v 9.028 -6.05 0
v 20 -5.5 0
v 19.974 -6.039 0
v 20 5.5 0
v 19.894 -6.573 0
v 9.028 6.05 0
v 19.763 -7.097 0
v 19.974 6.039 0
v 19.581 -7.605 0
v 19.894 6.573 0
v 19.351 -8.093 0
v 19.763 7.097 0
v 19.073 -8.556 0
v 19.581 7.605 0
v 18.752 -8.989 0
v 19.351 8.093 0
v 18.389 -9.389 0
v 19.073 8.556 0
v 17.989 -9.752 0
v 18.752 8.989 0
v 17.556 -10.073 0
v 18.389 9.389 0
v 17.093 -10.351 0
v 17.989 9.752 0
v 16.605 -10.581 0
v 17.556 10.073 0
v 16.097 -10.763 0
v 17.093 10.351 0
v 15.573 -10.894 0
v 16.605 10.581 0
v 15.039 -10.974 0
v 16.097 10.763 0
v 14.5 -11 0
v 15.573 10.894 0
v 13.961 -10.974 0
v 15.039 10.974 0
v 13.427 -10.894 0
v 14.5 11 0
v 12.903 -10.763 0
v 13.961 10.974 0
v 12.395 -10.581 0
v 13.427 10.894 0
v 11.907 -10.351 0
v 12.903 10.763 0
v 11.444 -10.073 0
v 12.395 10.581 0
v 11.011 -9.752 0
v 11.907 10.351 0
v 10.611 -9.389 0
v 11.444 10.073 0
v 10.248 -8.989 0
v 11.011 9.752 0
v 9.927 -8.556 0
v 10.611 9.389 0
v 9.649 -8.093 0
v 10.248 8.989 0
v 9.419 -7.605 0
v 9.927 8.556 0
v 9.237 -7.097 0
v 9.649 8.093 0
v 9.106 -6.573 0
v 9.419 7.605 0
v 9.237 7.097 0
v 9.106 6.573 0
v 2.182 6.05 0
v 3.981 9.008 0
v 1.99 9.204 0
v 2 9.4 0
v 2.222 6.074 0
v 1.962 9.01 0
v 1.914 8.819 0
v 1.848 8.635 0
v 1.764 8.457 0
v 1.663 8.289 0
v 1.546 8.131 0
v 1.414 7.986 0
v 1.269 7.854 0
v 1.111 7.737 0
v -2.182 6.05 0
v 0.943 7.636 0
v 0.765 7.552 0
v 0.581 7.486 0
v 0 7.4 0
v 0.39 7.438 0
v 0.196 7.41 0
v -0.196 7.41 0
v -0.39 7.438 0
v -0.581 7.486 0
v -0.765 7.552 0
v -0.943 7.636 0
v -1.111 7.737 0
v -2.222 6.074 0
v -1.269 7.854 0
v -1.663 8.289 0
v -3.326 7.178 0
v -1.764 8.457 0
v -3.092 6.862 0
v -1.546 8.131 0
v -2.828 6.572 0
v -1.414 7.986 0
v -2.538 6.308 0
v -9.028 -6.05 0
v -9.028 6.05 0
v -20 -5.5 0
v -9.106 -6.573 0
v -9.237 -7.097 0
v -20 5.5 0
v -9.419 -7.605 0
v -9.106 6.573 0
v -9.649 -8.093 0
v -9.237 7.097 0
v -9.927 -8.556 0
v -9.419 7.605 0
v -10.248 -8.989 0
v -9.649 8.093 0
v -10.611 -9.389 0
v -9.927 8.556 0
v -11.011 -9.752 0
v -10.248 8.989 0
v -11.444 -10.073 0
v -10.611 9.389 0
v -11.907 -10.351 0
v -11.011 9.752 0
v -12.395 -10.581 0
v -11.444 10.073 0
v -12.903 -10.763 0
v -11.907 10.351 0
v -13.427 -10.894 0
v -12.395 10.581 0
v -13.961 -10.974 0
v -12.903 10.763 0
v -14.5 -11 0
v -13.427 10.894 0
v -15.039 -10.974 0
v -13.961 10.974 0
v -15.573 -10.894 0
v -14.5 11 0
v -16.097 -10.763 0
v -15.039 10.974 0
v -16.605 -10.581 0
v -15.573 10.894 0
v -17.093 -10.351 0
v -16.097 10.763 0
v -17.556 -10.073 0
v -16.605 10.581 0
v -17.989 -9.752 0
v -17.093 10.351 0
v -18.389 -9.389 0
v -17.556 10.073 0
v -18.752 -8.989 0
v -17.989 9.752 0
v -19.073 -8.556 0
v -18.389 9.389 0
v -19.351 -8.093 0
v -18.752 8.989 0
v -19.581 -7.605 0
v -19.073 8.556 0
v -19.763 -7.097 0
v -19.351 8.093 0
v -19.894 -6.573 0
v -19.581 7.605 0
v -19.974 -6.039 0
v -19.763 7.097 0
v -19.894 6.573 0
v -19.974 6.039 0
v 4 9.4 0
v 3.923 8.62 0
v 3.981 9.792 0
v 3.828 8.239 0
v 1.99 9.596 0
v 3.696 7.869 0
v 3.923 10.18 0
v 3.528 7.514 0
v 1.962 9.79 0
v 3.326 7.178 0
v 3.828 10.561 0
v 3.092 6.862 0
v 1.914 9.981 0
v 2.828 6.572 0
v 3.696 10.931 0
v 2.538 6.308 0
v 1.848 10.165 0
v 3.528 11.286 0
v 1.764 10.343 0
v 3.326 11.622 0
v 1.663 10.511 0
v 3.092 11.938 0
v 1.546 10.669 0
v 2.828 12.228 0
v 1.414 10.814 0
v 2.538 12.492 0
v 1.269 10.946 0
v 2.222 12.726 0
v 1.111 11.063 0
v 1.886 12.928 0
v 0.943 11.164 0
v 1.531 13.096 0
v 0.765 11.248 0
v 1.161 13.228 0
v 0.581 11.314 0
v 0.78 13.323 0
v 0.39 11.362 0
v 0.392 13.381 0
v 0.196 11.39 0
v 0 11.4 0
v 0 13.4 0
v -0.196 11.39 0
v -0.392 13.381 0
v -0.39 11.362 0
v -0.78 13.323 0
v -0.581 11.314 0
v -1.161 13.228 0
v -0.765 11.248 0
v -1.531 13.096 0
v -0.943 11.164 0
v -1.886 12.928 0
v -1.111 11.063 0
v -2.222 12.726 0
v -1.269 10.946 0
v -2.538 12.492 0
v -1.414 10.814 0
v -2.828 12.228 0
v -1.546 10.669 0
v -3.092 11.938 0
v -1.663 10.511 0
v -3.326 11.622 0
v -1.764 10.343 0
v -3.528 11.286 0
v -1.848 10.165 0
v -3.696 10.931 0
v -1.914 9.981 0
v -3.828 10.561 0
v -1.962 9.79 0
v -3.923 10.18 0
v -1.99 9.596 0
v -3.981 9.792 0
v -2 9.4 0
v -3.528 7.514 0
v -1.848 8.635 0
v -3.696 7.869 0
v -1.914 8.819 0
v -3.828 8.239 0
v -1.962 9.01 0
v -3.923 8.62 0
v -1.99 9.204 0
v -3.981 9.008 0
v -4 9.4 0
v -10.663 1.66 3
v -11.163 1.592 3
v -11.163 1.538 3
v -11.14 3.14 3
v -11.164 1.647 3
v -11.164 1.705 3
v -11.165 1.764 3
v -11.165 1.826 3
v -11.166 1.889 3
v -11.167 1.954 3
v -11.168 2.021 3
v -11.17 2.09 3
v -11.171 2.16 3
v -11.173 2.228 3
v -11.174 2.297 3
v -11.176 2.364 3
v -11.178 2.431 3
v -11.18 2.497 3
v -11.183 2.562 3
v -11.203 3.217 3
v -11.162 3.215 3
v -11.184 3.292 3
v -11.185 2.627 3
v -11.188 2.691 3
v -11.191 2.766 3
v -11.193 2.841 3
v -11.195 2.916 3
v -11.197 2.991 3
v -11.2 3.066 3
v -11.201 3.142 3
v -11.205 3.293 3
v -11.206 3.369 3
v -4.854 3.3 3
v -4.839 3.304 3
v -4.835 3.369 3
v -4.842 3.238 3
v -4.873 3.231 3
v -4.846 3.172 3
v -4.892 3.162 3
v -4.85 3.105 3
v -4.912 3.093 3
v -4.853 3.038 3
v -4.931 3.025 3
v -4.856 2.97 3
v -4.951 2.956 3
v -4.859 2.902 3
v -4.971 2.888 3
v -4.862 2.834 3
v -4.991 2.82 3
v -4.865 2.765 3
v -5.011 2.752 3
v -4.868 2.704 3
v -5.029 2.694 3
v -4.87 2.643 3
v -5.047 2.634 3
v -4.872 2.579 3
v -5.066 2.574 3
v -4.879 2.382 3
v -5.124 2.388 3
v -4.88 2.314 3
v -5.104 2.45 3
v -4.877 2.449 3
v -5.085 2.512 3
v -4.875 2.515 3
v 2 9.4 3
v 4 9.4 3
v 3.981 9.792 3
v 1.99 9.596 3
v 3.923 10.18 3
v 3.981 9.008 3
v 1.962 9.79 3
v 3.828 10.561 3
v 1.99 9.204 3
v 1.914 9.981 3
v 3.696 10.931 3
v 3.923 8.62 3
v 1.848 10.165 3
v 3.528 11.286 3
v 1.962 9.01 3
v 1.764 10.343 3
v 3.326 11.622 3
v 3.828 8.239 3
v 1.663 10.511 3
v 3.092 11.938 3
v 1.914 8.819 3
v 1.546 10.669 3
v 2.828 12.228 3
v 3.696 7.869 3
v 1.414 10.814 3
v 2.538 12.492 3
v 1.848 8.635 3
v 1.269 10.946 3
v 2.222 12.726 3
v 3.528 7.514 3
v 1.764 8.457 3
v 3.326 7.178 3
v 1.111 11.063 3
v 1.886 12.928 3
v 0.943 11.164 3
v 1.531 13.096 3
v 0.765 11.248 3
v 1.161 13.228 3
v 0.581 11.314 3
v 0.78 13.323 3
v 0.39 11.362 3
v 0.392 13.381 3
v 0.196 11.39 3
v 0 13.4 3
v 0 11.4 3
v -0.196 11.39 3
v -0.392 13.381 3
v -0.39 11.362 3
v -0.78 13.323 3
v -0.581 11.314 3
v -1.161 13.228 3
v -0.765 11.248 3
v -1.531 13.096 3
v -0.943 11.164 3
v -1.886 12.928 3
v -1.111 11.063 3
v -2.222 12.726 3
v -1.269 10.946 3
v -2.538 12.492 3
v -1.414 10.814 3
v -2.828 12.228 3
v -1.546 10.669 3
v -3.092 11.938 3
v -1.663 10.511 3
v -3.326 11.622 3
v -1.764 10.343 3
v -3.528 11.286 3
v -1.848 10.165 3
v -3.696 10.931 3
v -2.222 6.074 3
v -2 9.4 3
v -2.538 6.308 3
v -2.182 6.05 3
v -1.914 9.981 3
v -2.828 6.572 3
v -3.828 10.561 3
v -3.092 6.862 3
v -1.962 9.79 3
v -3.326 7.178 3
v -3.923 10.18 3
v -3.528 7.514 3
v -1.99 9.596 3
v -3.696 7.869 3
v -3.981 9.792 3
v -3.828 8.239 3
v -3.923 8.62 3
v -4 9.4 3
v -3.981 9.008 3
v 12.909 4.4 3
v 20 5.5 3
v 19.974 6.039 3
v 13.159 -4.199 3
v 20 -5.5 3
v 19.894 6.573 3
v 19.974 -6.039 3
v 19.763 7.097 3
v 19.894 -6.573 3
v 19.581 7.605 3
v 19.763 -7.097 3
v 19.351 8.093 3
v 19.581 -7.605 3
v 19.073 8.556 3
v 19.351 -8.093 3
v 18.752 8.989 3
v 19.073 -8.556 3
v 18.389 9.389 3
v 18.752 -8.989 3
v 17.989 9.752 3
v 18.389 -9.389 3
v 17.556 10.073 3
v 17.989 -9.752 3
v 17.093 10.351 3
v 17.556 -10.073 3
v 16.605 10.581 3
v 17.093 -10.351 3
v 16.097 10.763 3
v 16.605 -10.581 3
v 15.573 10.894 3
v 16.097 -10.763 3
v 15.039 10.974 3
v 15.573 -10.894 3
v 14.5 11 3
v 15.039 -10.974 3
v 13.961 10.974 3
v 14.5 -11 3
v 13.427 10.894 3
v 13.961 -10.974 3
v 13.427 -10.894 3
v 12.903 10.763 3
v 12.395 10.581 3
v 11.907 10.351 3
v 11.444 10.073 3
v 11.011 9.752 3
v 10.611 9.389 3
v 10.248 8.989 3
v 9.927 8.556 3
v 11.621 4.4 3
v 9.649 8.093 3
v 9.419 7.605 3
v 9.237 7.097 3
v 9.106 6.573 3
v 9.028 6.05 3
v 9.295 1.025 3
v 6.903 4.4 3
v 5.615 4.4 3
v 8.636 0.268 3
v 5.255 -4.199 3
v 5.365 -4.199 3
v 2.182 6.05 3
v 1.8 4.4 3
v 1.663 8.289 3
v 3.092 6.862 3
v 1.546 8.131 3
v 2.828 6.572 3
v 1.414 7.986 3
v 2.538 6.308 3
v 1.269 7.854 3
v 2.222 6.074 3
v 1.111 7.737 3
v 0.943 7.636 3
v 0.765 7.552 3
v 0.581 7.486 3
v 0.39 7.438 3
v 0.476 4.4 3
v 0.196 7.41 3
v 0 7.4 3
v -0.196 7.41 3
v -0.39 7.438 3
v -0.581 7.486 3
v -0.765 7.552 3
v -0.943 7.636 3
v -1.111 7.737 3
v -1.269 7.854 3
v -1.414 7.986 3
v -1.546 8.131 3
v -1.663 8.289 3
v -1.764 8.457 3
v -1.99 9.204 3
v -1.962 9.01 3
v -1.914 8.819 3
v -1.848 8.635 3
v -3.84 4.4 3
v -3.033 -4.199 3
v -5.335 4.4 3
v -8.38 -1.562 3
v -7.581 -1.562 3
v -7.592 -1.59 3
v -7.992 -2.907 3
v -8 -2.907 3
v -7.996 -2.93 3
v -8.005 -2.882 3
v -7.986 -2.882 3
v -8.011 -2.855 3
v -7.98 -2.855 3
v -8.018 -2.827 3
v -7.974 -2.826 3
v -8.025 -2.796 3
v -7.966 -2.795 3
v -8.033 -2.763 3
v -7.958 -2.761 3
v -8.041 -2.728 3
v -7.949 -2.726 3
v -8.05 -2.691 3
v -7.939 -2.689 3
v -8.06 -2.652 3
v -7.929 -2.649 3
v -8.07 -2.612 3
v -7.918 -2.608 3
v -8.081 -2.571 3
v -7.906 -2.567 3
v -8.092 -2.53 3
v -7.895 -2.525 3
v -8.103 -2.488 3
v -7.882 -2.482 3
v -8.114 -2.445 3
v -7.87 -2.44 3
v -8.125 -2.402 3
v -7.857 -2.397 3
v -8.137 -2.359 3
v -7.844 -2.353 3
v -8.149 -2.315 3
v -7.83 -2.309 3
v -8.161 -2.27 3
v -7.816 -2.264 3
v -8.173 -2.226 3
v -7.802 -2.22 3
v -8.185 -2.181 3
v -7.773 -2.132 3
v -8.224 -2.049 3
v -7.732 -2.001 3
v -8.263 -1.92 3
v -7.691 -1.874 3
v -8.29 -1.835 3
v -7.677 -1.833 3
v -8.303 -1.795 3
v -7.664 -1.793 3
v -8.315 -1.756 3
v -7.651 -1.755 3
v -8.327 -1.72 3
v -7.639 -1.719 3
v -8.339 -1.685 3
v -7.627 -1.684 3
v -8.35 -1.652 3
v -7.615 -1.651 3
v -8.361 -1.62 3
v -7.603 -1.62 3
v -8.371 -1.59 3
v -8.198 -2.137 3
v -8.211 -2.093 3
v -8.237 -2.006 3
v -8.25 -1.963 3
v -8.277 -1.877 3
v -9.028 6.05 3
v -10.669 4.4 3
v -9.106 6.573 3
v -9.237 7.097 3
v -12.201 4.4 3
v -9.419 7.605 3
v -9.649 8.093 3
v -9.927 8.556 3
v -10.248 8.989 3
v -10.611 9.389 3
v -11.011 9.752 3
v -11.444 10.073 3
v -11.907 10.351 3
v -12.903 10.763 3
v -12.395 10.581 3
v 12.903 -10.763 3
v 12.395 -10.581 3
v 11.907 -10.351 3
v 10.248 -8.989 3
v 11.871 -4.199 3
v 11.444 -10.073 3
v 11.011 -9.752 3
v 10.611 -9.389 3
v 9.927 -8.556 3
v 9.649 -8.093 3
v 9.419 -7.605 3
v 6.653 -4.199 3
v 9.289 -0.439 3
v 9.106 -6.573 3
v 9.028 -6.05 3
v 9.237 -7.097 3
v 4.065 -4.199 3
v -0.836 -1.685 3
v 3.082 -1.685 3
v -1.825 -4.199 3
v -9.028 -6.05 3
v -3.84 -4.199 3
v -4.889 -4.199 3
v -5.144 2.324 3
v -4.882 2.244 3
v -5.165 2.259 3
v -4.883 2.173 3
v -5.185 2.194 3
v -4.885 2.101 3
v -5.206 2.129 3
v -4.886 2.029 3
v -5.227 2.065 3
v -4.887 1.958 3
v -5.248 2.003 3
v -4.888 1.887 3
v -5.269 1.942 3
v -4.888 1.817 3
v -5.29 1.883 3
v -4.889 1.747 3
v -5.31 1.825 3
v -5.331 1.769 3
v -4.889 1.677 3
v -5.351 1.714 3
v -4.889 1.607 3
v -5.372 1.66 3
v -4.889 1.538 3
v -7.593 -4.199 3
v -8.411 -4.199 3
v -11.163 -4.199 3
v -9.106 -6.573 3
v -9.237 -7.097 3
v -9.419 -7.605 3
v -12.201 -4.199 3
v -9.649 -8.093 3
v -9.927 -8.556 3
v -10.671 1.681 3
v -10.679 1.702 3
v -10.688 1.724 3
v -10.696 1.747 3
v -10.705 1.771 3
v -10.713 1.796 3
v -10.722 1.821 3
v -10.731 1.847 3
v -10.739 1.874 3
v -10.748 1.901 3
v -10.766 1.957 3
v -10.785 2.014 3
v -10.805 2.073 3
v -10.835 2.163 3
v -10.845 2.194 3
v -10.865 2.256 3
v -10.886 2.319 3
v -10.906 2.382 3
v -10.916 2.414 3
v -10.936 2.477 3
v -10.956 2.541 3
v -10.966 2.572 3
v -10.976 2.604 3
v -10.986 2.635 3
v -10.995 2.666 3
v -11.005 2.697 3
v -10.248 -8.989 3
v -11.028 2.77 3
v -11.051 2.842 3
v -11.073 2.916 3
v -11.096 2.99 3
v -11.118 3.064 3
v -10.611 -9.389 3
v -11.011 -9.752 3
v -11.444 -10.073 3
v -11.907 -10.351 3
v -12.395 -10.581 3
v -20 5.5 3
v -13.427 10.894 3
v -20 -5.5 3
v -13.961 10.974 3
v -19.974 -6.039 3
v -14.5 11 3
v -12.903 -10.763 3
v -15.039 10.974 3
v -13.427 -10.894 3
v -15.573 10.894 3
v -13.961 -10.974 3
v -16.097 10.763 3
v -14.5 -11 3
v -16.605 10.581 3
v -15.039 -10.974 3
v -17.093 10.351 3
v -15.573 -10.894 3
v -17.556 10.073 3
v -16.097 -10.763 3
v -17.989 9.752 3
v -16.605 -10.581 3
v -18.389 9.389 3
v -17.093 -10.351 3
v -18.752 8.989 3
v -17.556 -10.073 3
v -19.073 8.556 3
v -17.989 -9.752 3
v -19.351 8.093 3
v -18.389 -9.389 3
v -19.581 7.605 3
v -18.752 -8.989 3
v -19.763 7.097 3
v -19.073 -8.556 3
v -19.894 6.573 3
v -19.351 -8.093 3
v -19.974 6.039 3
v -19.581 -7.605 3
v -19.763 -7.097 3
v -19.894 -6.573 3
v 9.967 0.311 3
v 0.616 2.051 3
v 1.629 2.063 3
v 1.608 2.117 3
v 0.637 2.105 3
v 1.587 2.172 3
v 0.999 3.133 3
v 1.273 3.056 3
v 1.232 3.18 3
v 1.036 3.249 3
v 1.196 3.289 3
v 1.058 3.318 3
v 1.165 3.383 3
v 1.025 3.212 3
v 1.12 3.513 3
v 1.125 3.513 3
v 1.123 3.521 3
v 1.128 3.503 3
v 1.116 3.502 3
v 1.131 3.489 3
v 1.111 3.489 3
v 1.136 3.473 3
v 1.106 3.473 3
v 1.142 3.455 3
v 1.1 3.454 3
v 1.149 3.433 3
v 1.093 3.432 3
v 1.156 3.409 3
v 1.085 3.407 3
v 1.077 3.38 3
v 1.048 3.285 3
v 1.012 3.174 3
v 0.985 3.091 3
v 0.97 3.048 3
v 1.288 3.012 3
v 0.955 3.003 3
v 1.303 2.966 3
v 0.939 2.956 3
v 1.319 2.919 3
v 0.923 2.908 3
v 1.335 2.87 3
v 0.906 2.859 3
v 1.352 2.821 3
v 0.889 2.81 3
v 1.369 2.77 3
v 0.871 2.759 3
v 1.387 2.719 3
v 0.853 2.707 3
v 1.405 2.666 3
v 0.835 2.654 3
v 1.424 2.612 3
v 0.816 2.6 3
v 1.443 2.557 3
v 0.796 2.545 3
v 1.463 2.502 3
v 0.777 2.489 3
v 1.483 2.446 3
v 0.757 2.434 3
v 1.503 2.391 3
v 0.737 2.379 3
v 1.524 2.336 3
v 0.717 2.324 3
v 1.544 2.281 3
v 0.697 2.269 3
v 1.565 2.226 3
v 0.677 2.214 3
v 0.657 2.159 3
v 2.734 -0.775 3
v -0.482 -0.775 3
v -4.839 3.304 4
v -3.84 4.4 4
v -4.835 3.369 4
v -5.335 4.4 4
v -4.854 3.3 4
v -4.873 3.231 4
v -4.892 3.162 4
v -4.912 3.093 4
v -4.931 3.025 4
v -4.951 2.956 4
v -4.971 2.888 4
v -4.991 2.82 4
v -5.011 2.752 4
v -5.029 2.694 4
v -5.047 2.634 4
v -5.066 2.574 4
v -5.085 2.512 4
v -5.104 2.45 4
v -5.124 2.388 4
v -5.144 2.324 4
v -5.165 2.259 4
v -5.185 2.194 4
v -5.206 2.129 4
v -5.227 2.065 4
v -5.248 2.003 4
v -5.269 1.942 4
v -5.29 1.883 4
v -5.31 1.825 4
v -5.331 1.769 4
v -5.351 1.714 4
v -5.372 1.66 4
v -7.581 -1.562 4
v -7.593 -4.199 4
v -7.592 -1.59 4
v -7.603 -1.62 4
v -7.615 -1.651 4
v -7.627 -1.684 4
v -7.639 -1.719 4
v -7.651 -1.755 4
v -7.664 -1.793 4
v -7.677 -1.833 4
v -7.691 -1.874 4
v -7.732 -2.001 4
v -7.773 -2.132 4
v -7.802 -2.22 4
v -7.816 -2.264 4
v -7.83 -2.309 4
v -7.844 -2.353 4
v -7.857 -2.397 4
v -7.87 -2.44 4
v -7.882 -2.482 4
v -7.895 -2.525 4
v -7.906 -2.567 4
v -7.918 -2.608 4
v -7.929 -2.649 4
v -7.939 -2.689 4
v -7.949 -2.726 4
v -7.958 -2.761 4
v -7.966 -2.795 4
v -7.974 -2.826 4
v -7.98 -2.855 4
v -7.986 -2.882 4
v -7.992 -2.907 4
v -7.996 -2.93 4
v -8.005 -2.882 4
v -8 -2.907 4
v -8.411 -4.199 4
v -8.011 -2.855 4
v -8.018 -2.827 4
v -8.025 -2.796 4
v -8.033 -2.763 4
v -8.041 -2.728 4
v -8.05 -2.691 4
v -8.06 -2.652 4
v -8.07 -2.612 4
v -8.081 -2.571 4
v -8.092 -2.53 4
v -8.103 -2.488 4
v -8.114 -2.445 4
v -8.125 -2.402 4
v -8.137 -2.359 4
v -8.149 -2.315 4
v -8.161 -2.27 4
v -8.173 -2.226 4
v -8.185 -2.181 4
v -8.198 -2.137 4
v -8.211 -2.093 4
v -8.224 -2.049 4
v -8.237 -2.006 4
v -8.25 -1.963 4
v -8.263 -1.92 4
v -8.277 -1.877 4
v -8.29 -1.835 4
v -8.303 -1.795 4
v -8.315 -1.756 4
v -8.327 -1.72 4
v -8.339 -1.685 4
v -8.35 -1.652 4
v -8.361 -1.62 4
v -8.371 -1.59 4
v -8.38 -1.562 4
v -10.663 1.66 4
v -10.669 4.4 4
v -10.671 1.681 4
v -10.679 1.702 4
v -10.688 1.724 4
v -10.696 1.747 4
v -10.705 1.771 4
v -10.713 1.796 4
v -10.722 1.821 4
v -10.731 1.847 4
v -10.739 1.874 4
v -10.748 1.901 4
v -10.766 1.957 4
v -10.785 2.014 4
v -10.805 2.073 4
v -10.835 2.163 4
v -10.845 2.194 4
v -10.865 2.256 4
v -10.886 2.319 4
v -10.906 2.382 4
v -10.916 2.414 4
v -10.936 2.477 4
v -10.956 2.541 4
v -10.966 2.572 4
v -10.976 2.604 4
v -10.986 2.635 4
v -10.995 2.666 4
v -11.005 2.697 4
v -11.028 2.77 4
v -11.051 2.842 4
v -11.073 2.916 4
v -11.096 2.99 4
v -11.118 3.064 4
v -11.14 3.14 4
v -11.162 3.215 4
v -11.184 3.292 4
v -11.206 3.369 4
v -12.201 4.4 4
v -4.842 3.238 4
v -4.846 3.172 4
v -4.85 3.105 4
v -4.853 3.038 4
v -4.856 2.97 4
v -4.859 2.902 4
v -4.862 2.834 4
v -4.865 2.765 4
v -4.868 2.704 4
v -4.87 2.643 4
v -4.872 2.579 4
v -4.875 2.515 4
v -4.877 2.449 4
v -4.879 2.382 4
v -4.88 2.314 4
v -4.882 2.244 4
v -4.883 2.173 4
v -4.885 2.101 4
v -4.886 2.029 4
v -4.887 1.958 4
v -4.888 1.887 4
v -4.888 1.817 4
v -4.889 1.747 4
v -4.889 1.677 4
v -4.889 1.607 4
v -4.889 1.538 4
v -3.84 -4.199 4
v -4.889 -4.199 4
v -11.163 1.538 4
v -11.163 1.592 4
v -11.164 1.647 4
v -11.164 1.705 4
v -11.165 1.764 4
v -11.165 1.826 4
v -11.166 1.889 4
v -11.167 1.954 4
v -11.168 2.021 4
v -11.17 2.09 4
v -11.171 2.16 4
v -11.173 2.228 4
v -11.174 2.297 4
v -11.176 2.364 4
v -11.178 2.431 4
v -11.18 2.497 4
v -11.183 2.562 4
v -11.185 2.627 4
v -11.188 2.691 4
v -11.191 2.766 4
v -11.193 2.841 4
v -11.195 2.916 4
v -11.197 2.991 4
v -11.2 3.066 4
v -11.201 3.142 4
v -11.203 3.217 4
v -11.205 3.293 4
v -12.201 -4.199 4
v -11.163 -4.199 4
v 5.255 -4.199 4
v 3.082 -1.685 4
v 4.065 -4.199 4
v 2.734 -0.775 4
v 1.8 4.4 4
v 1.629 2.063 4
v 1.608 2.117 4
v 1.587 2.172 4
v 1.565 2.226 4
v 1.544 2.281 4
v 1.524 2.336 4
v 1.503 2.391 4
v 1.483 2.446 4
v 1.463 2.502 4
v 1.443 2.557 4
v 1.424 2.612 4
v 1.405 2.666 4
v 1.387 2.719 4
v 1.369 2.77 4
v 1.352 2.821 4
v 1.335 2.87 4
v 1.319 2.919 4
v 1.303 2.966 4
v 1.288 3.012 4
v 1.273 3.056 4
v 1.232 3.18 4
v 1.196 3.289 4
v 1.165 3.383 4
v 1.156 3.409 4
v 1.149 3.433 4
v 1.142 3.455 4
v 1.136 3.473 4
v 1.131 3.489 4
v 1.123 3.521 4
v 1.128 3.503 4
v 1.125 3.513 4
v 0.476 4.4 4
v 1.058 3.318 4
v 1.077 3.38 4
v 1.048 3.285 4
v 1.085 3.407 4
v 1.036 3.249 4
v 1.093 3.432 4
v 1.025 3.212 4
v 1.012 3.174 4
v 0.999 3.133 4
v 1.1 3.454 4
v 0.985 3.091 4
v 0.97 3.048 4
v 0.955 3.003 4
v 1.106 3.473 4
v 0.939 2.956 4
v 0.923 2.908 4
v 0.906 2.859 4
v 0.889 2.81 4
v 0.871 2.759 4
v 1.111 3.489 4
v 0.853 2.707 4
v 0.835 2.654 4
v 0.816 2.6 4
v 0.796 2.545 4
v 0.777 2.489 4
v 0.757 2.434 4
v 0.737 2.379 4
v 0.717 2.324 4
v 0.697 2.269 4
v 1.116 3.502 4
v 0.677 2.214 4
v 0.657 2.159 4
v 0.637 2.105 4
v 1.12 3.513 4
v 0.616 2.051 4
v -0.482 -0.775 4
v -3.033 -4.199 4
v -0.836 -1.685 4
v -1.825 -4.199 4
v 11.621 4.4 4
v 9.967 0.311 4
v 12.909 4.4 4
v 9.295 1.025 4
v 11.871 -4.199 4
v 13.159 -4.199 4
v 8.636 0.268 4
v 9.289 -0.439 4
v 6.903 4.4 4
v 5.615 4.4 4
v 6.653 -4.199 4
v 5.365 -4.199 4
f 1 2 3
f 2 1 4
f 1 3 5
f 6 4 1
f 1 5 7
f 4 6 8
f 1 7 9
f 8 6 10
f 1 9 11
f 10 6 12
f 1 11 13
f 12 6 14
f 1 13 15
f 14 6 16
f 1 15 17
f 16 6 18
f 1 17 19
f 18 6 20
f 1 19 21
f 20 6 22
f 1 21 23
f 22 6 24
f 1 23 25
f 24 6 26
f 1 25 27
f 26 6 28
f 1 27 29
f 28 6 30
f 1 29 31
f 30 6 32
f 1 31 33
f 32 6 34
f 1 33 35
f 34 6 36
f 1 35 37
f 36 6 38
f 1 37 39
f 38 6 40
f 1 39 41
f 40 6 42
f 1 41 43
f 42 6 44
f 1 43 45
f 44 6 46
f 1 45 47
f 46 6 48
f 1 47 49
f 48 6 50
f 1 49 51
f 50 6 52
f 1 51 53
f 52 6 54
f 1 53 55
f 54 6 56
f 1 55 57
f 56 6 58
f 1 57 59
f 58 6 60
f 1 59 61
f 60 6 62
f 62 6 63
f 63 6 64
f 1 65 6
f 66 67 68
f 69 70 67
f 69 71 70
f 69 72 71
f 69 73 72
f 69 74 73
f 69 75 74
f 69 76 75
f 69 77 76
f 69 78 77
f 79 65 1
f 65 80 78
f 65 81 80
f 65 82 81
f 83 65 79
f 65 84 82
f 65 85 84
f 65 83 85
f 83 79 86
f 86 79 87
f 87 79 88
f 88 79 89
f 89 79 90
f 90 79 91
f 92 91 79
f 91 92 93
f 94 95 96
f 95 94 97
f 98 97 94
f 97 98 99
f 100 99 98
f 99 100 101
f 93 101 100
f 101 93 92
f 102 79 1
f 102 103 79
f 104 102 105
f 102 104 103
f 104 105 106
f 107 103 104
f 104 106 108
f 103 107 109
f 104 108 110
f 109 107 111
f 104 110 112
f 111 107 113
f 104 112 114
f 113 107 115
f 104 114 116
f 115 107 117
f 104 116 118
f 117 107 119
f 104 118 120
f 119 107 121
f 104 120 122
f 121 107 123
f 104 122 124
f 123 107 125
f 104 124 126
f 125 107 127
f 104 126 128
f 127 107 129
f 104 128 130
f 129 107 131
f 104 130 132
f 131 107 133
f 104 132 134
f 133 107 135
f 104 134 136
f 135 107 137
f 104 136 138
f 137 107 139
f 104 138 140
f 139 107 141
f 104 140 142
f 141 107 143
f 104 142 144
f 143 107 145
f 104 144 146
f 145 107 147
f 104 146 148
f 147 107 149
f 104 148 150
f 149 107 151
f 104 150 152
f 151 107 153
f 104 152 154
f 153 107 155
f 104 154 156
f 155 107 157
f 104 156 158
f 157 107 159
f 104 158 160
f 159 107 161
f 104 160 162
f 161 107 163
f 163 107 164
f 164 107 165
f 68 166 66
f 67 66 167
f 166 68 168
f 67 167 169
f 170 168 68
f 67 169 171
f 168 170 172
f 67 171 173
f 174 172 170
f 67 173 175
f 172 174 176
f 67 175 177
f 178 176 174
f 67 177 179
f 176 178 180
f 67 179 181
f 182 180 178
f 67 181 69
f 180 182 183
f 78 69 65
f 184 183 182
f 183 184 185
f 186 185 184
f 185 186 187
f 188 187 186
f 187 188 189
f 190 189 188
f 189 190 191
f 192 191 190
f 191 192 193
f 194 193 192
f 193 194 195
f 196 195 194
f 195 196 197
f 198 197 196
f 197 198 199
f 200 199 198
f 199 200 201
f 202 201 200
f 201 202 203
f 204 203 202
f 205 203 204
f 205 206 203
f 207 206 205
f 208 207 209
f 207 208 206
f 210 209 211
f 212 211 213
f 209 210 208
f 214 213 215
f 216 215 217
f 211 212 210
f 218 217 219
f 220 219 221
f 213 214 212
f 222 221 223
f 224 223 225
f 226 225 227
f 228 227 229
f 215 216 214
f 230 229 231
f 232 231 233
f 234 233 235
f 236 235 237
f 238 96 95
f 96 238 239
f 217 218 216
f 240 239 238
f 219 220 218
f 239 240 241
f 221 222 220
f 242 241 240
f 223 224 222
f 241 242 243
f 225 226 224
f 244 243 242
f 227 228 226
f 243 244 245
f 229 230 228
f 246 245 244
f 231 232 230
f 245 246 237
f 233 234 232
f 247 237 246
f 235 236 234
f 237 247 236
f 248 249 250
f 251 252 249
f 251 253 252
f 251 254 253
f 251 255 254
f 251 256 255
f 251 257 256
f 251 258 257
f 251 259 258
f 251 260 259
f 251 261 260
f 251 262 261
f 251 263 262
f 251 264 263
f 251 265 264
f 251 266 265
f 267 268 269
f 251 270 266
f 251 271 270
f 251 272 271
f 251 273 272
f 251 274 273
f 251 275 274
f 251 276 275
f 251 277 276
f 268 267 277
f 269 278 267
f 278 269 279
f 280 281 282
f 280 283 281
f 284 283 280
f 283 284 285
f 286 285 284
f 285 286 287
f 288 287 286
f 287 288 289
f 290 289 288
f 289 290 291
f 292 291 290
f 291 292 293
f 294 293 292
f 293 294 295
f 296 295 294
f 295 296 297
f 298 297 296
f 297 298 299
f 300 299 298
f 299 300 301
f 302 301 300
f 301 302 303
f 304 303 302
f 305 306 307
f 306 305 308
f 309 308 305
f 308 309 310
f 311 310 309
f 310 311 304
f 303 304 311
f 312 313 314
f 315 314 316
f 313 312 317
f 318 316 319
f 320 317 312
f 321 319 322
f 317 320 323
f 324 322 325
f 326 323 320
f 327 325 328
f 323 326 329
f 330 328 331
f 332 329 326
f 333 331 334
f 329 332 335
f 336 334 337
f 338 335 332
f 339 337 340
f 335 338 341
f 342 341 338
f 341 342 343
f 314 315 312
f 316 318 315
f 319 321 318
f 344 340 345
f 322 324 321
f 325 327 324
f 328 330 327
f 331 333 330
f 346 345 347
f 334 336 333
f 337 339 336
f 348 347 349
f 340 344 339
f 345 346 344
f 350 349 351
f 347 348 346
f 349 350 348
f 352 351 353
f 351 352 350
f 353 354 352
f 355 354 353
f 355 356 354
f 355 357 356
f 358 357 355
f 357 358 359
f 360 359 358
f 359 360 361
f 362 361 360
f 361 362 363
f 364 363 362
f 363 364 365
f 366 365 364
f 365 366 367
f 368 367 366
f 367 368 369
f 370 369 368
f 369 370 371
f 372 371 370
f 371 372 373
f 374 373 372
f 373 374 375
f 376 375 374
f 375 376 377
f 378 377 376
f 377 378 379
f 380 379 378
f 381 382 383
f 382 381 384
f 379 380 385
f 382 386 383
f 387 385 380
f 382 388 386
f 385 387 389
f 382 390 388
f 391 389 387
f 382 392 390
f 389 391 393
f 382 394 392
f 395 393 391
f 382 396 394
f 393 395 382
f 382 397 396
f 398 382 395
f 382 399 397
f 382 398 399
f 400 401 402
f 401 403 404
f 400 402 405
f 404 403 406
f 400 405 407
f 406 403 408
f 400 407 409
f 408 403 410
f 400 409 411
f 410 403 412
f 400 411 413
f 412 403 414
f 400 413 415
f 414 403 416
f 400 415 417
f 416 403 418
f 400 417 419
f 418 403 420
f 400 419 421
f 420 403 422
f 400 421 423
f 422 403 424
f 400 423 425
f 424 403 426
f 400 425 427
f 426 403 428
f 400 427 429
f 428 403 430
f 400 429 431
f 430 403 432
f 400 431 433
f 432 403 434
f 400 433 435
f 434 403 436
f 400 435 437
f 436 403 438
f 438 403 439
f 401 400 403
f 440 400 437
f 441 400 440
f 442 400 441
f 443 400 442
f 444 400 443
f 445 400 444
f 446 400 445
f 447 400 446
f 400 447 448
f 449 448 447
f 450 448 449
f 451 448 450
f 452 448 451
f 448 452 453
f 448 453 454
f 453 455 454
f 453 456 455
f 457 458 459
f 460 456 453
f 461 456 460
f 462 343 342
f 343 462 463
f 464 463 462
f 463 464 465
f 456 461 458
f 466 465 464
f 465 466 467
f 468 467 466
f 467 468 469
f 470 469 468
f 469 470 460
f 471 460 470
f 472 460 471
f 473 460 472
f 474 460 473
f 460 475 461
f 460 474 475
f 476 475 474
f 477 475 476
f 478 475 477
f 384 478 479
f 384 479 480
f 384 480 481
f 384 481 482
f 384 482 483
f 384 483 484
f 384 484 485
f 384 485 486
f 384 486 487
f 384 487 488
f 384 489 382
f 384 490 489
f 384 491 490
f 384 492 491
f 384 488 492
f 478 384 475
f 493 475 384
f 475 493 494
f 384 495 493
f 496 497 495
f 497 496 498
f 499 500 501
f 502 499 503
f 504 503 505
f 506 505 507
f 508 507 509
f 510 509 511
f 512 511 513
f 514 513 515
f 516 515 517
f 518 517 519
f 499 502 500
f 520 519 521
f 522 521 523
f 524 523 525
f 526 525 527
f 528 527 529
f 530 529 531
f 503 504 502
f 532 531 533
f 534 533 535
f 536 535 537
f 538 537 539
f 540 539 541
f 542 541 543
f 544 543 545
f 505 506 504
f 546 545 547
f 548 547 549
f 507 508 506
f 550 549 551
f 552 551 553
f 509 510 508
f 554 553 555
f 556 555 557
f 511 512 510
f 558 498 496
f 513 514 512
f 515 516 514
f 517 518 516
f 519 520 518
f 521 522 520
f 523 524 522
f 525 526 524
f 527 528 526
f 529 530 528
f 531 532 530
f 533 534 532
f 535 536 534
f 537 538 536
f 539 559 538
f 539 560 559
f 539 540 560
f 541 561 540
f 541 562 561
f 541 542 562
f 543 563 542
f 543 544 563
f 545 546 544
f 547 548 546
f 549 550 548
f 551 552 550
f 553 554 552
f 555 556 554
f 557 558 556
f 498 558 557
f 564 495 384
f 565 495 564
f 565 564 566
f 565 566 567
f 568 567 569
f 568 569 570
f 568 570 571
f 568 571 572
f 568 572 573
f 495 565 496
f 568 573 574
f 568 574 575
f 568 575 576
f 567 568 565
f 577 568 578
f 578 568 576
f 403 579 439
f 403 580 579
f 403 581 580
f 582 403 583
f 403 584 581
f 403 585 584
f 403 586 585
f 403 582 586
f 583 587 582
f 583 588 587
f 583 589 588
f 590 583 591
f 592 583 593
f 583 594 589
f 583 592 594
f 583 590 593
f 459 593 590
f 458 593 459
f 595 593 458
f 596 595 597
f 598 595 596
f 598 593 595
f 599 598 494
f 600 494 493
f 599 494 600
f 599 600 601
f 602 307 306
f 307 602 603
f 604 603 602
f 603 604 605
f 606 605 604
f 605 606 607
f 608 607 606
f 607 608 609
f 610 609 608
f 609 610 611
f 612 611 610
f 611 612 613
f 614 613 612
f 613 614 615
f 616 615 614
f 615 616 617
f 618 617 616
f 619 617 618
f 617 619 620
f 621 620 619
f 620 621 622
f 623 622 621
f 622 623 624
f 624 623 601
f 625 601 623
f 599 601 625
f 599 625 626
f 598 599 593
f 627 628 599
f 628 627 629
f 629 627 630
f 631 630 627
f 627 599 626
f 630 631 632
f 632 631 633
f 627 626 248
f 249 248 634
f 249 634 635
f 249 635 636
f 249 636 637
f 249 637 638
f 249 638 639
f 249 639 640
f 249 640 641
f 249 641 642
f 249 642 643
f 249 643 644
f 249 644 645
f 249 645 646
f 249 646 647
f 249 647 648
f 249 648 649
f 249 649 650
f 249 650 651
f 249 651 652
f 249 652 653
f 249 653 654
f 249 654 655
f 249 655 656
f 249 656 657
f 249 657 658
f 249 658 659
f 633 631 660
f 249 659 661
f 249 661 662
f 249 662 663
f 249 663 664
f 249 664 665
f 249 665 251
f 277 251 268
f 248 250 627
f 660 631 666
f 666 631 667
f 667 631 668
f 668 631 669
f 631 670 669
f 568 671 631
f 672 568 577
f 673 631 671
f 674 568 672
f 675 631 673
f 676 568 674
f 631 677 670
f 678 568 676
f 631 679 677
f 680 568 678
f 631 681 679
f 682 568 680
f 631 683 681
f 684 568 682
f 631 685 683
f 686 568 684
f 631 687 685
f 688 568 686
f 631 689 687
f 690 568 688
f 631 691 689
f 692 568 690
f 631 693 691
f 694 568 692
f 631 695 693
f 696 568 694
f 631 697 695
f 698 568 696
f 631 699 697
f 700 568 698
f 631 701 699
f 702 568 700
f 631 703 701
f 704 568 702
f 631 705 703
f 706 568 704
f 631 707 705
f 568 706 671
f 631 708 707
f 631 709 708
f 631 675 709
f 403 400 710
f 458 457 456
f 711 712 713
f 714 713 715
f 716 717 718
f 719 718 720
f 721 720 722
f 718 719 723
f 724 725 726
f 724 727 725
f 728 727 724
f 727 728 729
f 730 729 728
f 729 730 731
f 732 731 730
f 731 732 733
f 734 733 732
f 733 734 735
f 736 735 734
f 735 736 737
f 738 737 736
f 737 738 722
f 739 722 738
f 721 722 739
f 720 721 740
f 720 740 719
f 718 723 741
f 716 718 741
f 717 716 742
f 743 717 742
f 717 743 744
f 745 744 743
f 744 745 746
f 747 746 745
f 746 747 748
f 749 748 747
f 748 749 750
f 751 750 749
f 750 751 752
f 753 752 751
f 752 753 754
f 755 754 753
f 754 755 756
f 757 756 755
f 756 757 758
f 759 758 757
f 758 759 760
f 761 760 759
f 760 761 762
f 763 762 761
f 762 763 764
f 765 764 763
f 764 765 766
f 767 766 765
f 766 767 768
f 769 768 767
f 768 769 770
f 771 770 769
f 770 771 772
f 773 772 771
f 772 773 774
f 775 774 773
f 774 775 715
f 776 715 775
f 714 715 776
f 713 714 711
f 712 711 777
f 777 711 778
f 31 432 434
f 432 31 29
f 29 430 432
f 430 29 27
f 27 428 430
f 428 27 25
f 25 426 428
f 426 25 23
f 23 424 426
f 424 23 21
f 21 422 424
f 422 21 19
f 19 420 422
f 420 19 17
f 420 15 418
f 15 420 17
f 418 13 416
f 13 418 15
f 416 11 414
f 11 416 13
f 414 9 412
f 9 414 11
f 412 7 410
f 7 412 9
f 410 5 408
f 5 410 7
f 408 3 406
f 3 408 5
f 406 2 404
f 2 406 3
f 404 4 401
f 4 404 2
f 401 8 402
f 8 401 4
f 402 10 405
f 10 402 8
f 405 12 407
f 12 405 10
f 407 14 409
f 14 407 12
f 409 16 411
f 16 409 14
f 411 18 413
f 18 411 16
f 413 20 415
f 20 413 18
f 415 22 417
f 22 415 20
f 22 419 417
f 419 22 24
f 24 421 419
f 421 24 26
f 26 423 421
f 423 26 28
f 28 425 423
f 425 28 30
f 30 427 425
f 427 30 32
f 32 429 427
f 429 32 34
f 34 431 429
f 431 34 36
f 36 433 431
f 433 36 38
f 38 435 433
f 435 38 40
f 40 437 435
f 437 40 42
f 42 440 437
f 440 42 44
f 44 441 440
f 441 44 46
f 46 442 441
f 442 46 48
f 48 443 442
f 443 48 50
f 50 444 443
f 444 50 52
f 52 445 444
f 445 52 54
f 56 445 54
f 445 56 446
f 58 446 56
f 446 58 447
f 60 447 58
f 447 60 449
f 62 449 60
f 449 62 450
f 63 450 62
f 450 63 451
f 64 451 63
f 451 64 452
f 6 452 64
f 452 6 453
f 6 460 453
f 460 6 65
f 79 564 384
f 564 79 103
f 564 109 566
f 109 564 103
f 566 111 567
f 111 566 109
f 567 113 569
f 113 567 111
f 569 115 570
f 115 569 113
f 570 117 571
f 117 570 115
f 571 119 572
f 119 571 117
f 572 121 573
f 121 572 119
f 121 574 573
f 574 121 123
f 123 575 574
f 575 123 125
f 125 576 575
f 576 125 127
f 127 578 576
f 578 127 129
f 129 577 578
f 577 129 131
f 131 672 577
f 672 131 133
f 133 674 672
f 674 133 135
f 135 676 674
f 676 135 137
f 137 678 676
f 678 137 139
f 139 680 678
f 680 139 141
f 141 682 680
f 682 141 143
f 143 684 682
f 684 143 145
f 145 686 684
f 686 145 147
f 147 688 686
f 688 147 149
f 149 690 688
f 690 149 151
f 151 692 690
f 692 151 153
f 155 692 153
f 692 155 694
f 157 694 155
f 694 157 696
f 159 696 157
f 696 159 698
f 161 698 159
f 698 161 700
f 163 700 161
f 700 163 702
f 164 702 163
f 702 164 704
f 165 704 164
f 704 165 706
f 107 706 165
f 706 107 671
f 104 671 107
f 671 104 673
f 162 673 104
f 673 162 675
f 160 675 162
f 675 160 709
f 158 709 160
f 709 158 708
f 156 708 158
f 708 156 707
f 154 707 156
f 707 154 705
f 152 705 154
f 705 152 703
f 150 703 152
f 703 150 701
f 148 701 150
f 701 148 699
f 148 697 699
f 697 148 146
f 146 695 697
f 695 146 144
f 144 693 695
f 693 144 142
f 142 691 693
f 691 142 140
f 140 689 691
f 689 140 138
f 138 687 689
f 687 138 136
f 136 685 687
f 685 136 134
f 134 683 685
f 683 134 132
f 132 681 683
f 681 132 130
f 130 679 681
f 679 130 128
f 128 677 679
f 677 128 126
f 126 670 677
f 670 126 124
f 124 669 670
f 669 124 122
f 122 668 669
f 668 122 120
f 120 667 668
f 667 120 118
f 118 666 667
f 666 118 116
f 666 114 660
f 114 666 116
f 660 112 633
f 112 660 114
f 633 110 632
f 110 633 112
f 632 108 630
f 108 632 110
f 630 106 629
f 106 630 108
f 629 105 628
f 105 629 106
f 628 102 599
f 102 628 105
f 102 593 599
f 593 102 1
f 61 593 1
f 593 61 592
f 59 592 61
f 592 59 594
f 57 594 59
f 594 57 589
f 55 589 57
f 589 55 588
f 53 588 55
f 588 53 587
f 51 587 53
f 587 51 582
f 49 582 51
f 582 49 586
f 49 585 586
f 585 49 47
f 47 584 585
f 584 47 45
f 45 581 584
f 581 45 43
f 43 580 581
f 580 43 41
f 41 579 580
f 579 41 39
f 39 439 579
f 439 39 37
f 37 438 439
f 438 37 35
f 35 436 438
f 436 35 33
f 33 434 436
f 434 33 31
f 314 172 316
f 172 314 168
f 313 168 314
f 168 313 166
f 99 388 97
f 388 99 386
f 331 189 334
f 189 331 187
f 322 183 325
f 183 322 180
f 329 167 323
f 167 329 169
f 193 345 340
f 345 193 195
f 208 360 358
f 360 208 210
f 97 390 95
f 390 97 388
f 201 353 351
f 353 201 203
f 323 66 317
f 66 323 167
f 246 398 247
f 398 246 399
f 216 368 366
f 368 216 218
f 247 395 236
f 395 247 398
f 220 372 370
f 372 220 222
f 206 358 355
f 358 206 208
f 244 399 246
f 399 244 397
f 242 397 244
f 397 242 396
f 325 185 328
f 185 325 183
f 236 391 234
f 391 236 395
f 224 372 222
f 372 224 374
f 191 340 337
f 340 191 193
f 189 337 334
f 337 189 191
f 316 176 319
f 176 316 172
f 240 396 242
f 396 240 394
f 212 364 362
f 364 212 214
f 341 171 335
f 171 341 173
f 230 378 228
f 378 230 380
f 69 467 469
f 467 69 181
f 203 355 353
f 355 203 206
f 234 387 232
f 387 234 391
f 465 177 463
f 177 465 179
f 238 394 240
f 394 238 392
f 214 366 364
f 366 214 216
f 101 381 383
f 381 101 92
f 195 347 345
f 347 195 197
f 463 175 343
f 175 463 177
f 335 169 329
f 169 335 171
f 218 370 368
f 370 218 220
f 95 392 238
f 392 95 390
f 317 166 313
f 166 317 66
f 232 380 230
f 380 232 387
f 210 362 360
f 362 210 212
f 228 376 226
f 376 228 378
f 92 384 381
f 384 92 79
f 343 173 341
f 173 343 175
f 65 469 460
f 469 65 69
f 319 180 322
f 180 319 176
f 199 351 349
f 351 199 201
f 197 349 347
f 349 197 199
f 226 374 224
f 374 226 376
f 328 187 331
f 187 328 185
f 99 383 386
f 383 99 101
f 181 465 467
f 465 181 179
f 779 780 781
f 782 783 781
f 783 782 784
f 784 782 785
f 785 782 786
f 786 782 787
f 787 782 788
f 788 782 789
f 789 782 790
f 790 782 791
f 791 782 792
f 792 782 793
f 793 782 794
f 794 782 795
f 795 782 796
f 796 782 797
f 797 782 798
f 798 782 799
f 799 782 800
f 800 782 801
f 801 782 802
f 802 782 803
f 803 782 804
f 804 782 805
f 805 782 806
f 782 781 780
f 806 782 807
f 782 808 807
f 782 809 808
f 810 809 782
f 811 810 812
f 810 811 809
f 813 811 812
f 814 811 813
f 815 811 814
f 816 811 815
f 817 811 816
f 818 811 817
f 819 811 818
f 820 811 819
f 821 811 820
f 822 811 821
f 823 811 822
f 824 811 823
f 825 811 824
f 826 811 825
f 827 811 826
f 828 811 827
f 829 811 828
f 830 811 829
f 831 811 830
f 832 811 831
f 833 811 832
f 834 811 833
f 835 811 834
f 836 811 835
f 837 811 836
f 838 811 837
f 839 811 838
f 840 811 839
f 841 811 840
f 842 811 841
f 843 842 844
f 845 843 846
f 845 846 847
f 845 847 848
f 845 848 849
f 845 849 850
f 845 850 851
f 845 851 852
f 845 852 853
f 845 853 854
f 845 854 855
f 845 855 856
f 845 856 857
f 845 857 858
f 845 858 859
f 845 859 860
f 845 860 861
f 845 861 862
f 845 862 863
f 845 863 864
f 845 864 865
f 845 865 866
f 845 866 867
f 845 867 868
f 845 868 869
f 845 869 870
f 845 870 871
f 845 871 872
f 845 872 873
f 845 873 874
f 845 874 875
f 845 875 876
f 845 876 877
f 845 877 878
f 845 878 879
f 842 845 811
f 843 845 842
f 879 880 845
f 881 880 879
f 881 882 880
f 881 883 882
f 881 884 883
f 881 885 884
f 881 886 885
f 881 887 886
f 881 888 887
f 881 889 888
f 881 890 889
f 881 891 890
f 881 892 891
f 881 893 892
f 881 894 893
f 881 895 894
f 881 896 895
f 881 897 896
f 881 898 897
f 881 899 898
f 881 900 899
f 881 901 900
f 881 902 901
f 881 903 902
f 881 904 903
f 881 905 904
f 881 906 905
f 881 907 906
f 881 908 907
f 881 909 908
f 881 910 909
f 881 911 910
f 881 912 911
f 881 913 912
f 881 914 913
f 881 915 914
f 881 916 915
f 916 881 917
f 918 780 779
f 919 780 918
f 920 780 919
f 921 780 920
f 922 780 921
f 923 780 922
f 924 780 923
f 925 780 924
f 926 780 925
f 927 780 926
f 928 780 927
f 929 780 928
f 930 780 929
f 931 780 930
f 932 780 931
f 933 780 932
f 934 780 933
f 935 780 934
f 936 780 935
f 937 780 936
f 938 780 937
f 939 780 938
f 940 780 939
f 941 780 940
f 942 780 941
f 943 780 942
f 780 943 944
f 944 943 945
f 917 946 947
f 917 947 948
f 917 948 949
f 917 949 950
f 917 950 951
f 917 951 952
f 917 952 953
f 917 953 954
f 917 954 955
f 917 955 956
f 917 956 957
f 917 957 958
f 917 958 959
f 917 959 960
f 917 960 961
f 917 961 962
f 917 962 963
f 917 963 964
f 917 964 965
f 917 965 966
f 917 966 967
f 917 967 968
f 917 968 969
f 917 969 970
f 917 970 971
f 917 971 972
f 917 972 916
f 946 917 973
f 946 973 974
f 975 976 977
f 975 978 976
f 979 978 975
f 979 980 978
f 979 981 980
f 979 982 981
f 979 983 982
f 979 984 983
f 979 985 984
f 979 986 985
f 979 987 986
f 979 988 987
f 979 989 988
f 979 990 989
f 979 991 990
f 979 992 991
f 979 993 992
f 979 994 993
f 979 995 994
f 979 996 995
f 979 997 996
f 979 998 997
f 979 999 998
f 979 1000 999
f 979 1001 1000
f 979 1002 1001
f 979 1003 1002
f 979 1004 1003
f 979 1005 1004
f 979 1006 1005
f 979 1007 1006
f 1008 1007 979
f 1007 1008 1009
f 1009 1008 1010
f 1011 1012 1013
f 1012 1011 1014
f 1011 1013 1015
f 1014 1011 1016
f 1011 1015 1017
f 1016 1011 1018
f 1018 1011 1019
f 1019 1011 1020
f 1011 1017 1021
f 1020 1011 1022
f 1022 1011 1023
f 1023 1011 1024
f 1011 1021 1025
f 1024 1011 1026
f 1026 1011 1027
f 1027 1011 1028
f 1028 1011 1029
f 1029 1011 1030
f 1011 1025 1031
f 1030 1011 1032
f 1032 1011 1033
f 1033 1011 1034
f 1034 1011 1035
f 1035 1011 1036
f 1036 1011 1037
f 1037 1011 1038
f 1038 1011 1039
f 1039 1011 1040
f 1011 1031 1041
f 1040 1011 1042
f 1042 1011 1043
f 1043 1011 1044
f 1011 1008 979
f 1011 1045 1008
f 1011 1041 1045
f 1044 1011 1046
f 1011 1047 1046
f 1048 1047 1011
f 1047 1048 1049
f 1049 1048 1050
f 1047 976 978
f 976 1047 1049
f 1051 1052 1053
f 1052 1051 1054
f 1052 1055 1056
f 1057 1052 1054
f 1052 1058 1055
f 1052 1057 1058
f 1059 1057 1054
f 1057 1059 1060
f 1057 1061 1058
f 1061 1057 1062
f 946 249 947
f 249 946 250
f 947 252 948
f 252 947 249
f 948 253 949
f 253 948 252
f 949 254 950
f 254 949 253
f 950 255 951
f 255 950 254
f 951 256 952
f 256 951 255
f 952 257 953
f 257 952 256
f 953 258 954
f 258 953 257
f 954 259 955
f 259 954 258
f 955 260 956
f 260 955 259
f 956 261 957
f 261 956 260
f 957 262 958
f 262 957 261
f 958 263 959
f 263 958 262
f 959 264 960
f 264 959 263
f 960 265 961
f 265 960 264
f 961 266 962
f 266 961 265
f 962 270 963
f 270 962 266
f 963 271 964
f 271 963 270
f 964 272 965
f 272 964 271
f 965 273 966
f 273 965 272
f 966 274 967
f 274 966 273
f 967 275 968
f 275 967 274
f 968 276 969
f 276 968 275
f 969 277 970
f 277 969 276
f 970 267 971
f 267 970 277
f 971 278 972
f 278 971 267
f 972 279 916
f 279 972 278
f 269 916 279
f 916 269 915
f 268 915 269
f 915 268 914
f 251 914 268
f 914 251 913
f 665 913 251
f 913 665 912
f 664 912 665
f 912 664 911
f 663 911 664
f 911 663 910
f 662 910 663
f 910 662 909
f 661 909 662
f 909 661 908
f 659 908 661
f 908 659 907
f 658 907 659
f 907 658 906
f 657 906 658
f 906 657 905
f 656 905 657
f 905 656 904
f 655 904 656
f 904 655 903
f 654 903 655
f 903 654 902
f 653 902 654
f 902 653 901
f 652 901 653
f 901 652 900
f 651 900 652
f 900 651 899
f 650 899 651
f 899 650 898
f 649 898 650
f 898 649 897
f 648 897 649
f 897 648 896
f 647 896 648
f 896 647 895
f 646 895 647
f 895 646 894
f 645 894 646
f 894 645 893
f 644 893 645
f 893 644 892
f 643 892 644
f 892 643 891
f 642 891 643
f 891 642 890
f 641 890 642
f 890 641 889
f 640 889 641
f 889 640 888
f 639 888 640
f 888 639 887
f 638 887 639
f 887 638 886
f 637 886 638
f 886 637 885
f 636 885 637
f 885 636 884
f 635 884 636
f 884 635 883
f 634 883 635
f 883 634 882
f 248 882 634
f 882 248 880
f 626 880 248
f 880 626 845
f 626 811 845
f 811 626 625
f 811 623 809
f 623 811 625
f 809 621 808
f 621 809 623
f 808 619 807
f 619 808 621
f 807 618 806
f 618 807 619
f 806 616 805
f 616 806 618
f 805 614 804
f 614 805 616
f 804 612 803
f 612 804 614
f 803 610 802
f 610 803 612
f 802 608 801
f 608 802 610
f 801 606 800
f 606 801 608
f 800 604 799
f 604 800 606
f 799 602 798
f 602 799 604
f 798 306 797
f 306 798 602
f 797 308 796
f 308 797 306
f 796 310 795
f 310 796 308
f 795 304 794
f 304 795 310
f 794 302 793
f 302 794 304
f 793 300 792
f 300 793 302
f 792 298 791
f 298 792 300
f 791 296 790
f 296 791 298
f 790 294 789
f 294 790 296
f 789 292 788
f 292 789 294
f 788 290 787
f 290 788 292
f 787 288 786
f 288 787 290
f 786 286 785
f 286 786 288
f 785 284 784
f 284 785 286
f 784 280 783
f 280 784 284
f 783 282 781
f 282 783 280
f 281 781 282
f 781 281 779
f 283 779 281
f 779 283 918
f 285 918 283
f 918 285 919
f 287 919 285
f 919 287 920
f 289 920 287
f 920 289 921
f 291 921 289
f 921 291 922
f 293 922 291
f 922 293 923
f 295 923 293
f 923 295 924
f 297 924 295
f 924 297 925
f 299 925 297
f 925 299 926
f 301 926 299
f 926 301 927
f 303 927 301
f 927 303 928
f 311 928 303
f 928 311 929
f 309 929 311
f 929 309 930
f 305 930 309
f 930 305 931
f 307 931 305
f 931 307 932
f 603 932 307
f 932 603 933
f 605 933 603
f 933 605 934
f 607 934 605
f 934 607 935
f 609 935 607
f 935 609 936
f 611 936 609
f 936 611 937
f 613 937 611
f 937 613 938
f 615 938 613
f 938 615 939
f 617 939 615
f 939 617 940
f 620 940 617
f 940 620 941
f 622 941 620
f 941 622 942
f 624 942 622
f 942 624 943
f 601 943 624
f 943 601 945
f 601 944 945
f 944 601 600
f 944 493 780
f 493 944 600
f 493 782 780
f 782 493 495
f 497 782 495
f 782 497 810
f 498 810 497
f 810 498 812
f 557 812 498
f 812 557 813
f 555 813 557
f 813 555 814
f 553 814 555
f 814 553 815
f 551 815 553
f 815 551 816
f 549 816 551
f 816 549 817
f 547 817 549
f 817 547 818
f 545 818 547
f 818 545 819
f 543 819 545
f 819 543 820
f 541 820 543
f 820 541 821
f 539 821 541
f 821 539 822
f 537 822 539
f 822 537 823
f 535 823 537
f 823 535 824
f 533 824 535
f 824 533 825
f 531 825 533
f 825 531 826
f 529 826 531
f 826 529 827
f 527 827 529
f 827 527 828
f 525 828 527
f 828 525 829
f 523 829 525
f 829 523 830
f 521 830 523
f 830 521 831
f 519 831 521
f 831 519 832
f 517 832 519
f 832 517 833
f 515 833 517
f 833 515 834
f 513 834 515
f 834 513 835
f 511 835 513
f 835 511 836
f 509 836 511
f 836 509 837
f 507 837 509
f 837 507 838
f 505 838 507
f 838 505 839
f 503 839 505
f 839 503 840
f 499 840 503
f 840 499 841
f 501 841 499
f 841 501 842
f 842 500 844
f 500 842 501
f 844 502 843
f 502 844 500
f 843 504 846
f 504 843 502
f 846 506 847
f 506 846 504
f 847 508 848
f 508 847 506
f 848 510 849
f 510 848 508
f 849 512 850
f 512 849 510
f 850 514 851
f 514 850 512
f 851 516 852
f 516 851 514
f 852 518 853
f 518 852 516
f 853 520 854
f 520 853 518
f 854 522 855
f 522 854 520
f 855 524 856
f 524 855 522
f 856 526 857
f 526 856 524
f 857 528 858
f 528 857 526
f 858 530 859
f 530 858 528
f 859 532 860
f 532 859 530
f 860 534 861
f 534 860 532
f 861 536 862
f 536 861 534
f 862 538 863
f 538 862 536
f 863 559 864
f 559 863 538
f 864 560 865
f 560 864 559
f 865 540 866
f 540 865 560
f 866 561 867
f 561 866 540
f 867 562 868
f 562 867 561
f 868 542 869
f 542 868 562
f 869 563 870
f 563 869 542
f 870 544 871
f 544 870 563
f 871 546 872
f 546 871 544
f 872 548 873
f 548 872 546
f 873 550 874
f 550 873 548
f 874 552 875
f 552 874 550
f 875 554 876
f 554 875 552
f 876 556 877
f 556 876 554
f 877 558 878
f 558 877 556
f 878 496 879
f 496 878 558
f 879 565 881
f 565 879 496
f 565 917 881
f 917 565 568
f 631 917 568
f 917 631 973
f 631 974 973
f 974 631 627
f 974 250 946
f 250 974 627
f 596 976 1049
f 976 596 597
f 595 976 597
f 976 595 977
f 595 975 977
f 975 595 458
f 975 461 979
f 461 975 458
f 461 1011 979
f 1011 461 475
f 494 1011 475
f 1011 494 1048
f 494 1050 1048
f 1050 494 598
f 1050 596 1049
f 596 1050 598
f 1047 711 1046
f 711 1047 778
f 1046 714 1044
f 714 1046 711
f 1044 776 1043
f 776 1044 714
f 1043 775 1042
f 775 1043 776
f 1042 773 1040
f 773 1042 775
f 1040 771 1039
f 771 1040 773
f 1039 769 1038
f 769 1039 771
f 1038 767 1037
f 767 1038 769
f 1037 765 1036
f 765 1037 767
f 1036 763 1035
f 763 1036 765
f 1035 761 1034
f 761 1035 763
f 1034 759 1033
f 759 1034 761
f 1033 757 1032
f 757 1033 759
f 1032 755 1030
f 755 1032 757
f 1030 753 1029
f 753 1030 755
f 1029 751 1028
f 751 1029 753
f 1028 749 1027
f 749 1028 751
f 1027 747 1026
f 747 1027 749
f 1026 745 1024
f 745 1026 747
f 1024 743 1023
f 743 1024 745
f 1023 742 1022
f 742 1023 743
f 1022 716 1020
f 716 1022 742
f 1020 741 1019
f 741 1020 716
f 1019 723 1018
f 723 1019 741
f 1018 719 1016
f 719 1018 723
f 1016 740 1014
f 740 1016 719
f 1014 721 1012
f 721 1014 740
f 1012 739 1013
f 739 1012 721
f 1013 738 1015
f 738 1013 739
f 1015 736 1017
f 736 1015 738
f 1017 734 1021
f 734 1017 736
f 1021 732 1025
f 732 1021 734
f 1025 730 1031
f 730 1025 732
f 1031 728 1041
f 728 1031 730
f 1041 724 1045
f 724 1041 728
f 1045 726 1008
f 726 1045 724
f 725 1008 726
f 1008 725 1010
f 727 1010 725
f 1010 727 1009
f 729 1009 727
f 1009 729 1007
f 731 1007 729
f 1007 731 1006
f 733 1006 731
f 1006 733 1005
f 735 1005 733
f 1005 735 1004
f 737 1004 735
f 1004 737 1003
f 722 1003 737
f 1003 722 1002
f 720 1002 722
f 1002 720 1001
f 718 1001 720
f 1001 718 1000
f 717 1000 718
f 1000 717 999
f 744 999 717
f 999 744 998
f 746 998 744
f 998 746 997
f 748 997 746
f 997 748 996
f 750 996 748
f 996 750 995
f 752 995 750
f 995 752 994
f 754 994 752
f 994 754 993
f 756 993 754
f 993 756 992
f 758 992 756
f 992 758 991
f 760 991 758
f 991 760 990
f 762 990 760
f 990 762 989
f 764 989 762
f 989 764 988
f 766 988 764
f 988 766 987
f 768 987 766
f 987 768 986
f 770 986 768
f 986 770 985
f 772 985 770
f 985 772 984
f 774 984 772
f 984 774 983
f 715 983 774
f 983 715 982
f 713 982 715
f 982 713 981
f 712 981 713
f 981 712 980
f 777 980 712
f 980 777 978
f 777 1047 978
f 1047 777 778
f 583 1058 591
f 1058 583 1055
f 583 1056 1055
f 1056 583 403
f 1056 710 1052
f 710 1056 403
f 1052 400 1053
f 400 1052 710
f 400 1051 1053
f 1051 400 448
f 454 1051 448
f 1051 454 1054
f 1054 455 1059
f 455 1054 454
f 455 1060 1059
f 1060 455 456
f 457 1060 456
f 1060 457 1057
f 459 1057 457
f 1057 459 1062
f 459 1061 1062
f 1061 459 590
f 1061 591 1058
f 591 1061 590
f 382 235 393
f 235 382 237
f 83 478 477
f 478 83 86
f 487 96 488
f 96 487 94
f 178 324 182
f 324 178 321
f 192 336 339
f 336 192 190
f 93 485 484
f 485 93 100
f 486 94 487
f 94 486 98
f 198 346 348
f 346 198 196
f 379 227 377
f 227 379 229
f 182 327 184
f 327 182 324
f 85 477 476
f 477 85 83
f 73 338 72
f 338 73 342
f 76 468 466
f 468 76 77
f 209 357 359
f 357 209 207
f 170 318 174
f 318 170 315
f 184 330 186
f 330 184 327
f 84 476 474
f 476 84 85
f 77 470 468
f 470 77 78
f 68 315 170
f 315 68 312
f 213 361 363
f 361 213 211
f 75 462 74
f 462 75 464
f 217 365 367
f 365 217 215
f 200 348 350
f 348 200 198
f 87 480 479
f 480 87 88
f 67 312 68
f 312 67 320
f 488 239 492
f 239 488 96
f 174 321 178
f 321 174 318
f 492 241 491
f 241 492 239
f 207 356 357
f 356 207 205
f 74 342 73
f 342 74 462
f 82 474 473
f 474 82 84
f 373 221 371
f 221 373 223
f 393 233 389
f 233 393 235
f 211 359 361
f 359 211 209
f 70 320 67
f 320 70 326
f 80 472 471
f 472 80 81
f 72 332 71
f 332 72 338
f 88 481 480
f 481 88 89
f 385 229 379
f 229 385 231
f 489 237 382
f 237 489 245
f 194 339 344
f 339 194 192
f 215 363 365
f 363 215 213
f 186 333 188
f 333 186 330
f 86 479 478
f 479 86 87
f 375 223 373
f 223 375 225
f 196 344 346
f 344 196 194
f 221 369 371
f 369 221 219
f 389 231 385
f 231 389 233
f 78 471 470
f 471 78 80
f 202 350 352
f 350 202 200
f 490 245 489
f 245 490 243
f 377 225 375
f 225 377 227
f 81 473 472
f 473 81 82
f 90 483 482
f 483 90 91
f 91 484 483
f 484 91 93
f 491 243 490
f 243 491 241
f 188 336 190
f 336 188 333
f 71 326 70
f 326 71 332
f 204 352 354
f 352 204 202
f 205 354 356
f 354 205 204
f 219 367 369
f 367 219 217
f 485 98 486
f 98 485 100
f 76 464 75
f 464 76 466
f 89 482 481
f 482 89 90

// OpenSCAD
// pet_tag/model.scad — round / bone / heart pet ID tag with ring hole.

line1 = "MAX";
line2 = "";
shape = "bone";        // "bone" | "round" | "heart"
emboss = 1;
tag_w = 40;
th = 3;
hole_d = 4;
text_size = 9;
line_gap = 6;
text_height = 1.0;
offset_x = 0;
offset_y = 0;

$fn = 64;

// Parametric heart (same curve as the lithophane templates)
function _hx(t) = 16 * pow(sin(t), 3);
function _hy(t) = 13*cos(t) - 5*cos(2*t) - 2*cos(3*t) - cos(4*t);

module heart_2d(w, h) {
  scale([w / 32, h / 29.5])
    translate([0, 2.25])
      polygon([for (i = [0 : 127]) let(t = i * 360 / 128) [_hx(t), _hy(t)]]);
}

module bone_2d(w, h) {
  r = h / 4;
  union() {
    hull() {
      translate([-w/2 + r,  h/2 - r]) circle(r = r);
      translate([-w/2 + r, -h/2 + r]) circle(r = r);
    }
    hull() {
      translate([w/2 - r,  h/2 - r]) circle(r = r);
      translate([w/2 - r, -h/2 + r]) circle(r = r);
    }
    square([w - 2*r, h * 0.55], center = true);
  }
}

tag_h = (shape == "bone") ? tag_w * 0.55 : tag_w;

module tag_2d() {
  if (shape == "round")
    circle(d = tag_w);
  else if (shape == "heart")
    heart_2d(tag_w, tag_w);
  else
    bone_2d(tag_w, tag_h);
}

// Hanger boss sits at the top edge of the shape
boss_r = hole_d / 2 + 2;
boss_y = tag_h / 2 - boss_r * 0.4;

module line_text_3d(s, y) {
  translate([offset_x, offset_y + y, 0])
    linear_extrude(height = text_height)
      text(s, size = text_size, halign = "center", valign = "center");
}

module text_block() {
  if (line2 == "") line_text_3d(line1, 0);
  else {
    line_text_3d(line1, line_gap / 2);
    line_text_3d(line2, -line_gap / 2);
  }
}

difference() {
  union() {
    linear_extrude(height = th) tag_2d();
    // hanger boss
    translate([0, boss_y, 0])
      linear_extrude(height = th)
        circle(r = boss_r);
    if (emboss == 1)
      translate([0, 0, th]) text_block();
  }
  // ring hole
  translate([0, boss_y, -1])
    cylinder(h = th + 2, d = hole_d);
  // engrave
  if (emboss == 0)
    translate([0, 0, th - text_height]) text_block();
}
